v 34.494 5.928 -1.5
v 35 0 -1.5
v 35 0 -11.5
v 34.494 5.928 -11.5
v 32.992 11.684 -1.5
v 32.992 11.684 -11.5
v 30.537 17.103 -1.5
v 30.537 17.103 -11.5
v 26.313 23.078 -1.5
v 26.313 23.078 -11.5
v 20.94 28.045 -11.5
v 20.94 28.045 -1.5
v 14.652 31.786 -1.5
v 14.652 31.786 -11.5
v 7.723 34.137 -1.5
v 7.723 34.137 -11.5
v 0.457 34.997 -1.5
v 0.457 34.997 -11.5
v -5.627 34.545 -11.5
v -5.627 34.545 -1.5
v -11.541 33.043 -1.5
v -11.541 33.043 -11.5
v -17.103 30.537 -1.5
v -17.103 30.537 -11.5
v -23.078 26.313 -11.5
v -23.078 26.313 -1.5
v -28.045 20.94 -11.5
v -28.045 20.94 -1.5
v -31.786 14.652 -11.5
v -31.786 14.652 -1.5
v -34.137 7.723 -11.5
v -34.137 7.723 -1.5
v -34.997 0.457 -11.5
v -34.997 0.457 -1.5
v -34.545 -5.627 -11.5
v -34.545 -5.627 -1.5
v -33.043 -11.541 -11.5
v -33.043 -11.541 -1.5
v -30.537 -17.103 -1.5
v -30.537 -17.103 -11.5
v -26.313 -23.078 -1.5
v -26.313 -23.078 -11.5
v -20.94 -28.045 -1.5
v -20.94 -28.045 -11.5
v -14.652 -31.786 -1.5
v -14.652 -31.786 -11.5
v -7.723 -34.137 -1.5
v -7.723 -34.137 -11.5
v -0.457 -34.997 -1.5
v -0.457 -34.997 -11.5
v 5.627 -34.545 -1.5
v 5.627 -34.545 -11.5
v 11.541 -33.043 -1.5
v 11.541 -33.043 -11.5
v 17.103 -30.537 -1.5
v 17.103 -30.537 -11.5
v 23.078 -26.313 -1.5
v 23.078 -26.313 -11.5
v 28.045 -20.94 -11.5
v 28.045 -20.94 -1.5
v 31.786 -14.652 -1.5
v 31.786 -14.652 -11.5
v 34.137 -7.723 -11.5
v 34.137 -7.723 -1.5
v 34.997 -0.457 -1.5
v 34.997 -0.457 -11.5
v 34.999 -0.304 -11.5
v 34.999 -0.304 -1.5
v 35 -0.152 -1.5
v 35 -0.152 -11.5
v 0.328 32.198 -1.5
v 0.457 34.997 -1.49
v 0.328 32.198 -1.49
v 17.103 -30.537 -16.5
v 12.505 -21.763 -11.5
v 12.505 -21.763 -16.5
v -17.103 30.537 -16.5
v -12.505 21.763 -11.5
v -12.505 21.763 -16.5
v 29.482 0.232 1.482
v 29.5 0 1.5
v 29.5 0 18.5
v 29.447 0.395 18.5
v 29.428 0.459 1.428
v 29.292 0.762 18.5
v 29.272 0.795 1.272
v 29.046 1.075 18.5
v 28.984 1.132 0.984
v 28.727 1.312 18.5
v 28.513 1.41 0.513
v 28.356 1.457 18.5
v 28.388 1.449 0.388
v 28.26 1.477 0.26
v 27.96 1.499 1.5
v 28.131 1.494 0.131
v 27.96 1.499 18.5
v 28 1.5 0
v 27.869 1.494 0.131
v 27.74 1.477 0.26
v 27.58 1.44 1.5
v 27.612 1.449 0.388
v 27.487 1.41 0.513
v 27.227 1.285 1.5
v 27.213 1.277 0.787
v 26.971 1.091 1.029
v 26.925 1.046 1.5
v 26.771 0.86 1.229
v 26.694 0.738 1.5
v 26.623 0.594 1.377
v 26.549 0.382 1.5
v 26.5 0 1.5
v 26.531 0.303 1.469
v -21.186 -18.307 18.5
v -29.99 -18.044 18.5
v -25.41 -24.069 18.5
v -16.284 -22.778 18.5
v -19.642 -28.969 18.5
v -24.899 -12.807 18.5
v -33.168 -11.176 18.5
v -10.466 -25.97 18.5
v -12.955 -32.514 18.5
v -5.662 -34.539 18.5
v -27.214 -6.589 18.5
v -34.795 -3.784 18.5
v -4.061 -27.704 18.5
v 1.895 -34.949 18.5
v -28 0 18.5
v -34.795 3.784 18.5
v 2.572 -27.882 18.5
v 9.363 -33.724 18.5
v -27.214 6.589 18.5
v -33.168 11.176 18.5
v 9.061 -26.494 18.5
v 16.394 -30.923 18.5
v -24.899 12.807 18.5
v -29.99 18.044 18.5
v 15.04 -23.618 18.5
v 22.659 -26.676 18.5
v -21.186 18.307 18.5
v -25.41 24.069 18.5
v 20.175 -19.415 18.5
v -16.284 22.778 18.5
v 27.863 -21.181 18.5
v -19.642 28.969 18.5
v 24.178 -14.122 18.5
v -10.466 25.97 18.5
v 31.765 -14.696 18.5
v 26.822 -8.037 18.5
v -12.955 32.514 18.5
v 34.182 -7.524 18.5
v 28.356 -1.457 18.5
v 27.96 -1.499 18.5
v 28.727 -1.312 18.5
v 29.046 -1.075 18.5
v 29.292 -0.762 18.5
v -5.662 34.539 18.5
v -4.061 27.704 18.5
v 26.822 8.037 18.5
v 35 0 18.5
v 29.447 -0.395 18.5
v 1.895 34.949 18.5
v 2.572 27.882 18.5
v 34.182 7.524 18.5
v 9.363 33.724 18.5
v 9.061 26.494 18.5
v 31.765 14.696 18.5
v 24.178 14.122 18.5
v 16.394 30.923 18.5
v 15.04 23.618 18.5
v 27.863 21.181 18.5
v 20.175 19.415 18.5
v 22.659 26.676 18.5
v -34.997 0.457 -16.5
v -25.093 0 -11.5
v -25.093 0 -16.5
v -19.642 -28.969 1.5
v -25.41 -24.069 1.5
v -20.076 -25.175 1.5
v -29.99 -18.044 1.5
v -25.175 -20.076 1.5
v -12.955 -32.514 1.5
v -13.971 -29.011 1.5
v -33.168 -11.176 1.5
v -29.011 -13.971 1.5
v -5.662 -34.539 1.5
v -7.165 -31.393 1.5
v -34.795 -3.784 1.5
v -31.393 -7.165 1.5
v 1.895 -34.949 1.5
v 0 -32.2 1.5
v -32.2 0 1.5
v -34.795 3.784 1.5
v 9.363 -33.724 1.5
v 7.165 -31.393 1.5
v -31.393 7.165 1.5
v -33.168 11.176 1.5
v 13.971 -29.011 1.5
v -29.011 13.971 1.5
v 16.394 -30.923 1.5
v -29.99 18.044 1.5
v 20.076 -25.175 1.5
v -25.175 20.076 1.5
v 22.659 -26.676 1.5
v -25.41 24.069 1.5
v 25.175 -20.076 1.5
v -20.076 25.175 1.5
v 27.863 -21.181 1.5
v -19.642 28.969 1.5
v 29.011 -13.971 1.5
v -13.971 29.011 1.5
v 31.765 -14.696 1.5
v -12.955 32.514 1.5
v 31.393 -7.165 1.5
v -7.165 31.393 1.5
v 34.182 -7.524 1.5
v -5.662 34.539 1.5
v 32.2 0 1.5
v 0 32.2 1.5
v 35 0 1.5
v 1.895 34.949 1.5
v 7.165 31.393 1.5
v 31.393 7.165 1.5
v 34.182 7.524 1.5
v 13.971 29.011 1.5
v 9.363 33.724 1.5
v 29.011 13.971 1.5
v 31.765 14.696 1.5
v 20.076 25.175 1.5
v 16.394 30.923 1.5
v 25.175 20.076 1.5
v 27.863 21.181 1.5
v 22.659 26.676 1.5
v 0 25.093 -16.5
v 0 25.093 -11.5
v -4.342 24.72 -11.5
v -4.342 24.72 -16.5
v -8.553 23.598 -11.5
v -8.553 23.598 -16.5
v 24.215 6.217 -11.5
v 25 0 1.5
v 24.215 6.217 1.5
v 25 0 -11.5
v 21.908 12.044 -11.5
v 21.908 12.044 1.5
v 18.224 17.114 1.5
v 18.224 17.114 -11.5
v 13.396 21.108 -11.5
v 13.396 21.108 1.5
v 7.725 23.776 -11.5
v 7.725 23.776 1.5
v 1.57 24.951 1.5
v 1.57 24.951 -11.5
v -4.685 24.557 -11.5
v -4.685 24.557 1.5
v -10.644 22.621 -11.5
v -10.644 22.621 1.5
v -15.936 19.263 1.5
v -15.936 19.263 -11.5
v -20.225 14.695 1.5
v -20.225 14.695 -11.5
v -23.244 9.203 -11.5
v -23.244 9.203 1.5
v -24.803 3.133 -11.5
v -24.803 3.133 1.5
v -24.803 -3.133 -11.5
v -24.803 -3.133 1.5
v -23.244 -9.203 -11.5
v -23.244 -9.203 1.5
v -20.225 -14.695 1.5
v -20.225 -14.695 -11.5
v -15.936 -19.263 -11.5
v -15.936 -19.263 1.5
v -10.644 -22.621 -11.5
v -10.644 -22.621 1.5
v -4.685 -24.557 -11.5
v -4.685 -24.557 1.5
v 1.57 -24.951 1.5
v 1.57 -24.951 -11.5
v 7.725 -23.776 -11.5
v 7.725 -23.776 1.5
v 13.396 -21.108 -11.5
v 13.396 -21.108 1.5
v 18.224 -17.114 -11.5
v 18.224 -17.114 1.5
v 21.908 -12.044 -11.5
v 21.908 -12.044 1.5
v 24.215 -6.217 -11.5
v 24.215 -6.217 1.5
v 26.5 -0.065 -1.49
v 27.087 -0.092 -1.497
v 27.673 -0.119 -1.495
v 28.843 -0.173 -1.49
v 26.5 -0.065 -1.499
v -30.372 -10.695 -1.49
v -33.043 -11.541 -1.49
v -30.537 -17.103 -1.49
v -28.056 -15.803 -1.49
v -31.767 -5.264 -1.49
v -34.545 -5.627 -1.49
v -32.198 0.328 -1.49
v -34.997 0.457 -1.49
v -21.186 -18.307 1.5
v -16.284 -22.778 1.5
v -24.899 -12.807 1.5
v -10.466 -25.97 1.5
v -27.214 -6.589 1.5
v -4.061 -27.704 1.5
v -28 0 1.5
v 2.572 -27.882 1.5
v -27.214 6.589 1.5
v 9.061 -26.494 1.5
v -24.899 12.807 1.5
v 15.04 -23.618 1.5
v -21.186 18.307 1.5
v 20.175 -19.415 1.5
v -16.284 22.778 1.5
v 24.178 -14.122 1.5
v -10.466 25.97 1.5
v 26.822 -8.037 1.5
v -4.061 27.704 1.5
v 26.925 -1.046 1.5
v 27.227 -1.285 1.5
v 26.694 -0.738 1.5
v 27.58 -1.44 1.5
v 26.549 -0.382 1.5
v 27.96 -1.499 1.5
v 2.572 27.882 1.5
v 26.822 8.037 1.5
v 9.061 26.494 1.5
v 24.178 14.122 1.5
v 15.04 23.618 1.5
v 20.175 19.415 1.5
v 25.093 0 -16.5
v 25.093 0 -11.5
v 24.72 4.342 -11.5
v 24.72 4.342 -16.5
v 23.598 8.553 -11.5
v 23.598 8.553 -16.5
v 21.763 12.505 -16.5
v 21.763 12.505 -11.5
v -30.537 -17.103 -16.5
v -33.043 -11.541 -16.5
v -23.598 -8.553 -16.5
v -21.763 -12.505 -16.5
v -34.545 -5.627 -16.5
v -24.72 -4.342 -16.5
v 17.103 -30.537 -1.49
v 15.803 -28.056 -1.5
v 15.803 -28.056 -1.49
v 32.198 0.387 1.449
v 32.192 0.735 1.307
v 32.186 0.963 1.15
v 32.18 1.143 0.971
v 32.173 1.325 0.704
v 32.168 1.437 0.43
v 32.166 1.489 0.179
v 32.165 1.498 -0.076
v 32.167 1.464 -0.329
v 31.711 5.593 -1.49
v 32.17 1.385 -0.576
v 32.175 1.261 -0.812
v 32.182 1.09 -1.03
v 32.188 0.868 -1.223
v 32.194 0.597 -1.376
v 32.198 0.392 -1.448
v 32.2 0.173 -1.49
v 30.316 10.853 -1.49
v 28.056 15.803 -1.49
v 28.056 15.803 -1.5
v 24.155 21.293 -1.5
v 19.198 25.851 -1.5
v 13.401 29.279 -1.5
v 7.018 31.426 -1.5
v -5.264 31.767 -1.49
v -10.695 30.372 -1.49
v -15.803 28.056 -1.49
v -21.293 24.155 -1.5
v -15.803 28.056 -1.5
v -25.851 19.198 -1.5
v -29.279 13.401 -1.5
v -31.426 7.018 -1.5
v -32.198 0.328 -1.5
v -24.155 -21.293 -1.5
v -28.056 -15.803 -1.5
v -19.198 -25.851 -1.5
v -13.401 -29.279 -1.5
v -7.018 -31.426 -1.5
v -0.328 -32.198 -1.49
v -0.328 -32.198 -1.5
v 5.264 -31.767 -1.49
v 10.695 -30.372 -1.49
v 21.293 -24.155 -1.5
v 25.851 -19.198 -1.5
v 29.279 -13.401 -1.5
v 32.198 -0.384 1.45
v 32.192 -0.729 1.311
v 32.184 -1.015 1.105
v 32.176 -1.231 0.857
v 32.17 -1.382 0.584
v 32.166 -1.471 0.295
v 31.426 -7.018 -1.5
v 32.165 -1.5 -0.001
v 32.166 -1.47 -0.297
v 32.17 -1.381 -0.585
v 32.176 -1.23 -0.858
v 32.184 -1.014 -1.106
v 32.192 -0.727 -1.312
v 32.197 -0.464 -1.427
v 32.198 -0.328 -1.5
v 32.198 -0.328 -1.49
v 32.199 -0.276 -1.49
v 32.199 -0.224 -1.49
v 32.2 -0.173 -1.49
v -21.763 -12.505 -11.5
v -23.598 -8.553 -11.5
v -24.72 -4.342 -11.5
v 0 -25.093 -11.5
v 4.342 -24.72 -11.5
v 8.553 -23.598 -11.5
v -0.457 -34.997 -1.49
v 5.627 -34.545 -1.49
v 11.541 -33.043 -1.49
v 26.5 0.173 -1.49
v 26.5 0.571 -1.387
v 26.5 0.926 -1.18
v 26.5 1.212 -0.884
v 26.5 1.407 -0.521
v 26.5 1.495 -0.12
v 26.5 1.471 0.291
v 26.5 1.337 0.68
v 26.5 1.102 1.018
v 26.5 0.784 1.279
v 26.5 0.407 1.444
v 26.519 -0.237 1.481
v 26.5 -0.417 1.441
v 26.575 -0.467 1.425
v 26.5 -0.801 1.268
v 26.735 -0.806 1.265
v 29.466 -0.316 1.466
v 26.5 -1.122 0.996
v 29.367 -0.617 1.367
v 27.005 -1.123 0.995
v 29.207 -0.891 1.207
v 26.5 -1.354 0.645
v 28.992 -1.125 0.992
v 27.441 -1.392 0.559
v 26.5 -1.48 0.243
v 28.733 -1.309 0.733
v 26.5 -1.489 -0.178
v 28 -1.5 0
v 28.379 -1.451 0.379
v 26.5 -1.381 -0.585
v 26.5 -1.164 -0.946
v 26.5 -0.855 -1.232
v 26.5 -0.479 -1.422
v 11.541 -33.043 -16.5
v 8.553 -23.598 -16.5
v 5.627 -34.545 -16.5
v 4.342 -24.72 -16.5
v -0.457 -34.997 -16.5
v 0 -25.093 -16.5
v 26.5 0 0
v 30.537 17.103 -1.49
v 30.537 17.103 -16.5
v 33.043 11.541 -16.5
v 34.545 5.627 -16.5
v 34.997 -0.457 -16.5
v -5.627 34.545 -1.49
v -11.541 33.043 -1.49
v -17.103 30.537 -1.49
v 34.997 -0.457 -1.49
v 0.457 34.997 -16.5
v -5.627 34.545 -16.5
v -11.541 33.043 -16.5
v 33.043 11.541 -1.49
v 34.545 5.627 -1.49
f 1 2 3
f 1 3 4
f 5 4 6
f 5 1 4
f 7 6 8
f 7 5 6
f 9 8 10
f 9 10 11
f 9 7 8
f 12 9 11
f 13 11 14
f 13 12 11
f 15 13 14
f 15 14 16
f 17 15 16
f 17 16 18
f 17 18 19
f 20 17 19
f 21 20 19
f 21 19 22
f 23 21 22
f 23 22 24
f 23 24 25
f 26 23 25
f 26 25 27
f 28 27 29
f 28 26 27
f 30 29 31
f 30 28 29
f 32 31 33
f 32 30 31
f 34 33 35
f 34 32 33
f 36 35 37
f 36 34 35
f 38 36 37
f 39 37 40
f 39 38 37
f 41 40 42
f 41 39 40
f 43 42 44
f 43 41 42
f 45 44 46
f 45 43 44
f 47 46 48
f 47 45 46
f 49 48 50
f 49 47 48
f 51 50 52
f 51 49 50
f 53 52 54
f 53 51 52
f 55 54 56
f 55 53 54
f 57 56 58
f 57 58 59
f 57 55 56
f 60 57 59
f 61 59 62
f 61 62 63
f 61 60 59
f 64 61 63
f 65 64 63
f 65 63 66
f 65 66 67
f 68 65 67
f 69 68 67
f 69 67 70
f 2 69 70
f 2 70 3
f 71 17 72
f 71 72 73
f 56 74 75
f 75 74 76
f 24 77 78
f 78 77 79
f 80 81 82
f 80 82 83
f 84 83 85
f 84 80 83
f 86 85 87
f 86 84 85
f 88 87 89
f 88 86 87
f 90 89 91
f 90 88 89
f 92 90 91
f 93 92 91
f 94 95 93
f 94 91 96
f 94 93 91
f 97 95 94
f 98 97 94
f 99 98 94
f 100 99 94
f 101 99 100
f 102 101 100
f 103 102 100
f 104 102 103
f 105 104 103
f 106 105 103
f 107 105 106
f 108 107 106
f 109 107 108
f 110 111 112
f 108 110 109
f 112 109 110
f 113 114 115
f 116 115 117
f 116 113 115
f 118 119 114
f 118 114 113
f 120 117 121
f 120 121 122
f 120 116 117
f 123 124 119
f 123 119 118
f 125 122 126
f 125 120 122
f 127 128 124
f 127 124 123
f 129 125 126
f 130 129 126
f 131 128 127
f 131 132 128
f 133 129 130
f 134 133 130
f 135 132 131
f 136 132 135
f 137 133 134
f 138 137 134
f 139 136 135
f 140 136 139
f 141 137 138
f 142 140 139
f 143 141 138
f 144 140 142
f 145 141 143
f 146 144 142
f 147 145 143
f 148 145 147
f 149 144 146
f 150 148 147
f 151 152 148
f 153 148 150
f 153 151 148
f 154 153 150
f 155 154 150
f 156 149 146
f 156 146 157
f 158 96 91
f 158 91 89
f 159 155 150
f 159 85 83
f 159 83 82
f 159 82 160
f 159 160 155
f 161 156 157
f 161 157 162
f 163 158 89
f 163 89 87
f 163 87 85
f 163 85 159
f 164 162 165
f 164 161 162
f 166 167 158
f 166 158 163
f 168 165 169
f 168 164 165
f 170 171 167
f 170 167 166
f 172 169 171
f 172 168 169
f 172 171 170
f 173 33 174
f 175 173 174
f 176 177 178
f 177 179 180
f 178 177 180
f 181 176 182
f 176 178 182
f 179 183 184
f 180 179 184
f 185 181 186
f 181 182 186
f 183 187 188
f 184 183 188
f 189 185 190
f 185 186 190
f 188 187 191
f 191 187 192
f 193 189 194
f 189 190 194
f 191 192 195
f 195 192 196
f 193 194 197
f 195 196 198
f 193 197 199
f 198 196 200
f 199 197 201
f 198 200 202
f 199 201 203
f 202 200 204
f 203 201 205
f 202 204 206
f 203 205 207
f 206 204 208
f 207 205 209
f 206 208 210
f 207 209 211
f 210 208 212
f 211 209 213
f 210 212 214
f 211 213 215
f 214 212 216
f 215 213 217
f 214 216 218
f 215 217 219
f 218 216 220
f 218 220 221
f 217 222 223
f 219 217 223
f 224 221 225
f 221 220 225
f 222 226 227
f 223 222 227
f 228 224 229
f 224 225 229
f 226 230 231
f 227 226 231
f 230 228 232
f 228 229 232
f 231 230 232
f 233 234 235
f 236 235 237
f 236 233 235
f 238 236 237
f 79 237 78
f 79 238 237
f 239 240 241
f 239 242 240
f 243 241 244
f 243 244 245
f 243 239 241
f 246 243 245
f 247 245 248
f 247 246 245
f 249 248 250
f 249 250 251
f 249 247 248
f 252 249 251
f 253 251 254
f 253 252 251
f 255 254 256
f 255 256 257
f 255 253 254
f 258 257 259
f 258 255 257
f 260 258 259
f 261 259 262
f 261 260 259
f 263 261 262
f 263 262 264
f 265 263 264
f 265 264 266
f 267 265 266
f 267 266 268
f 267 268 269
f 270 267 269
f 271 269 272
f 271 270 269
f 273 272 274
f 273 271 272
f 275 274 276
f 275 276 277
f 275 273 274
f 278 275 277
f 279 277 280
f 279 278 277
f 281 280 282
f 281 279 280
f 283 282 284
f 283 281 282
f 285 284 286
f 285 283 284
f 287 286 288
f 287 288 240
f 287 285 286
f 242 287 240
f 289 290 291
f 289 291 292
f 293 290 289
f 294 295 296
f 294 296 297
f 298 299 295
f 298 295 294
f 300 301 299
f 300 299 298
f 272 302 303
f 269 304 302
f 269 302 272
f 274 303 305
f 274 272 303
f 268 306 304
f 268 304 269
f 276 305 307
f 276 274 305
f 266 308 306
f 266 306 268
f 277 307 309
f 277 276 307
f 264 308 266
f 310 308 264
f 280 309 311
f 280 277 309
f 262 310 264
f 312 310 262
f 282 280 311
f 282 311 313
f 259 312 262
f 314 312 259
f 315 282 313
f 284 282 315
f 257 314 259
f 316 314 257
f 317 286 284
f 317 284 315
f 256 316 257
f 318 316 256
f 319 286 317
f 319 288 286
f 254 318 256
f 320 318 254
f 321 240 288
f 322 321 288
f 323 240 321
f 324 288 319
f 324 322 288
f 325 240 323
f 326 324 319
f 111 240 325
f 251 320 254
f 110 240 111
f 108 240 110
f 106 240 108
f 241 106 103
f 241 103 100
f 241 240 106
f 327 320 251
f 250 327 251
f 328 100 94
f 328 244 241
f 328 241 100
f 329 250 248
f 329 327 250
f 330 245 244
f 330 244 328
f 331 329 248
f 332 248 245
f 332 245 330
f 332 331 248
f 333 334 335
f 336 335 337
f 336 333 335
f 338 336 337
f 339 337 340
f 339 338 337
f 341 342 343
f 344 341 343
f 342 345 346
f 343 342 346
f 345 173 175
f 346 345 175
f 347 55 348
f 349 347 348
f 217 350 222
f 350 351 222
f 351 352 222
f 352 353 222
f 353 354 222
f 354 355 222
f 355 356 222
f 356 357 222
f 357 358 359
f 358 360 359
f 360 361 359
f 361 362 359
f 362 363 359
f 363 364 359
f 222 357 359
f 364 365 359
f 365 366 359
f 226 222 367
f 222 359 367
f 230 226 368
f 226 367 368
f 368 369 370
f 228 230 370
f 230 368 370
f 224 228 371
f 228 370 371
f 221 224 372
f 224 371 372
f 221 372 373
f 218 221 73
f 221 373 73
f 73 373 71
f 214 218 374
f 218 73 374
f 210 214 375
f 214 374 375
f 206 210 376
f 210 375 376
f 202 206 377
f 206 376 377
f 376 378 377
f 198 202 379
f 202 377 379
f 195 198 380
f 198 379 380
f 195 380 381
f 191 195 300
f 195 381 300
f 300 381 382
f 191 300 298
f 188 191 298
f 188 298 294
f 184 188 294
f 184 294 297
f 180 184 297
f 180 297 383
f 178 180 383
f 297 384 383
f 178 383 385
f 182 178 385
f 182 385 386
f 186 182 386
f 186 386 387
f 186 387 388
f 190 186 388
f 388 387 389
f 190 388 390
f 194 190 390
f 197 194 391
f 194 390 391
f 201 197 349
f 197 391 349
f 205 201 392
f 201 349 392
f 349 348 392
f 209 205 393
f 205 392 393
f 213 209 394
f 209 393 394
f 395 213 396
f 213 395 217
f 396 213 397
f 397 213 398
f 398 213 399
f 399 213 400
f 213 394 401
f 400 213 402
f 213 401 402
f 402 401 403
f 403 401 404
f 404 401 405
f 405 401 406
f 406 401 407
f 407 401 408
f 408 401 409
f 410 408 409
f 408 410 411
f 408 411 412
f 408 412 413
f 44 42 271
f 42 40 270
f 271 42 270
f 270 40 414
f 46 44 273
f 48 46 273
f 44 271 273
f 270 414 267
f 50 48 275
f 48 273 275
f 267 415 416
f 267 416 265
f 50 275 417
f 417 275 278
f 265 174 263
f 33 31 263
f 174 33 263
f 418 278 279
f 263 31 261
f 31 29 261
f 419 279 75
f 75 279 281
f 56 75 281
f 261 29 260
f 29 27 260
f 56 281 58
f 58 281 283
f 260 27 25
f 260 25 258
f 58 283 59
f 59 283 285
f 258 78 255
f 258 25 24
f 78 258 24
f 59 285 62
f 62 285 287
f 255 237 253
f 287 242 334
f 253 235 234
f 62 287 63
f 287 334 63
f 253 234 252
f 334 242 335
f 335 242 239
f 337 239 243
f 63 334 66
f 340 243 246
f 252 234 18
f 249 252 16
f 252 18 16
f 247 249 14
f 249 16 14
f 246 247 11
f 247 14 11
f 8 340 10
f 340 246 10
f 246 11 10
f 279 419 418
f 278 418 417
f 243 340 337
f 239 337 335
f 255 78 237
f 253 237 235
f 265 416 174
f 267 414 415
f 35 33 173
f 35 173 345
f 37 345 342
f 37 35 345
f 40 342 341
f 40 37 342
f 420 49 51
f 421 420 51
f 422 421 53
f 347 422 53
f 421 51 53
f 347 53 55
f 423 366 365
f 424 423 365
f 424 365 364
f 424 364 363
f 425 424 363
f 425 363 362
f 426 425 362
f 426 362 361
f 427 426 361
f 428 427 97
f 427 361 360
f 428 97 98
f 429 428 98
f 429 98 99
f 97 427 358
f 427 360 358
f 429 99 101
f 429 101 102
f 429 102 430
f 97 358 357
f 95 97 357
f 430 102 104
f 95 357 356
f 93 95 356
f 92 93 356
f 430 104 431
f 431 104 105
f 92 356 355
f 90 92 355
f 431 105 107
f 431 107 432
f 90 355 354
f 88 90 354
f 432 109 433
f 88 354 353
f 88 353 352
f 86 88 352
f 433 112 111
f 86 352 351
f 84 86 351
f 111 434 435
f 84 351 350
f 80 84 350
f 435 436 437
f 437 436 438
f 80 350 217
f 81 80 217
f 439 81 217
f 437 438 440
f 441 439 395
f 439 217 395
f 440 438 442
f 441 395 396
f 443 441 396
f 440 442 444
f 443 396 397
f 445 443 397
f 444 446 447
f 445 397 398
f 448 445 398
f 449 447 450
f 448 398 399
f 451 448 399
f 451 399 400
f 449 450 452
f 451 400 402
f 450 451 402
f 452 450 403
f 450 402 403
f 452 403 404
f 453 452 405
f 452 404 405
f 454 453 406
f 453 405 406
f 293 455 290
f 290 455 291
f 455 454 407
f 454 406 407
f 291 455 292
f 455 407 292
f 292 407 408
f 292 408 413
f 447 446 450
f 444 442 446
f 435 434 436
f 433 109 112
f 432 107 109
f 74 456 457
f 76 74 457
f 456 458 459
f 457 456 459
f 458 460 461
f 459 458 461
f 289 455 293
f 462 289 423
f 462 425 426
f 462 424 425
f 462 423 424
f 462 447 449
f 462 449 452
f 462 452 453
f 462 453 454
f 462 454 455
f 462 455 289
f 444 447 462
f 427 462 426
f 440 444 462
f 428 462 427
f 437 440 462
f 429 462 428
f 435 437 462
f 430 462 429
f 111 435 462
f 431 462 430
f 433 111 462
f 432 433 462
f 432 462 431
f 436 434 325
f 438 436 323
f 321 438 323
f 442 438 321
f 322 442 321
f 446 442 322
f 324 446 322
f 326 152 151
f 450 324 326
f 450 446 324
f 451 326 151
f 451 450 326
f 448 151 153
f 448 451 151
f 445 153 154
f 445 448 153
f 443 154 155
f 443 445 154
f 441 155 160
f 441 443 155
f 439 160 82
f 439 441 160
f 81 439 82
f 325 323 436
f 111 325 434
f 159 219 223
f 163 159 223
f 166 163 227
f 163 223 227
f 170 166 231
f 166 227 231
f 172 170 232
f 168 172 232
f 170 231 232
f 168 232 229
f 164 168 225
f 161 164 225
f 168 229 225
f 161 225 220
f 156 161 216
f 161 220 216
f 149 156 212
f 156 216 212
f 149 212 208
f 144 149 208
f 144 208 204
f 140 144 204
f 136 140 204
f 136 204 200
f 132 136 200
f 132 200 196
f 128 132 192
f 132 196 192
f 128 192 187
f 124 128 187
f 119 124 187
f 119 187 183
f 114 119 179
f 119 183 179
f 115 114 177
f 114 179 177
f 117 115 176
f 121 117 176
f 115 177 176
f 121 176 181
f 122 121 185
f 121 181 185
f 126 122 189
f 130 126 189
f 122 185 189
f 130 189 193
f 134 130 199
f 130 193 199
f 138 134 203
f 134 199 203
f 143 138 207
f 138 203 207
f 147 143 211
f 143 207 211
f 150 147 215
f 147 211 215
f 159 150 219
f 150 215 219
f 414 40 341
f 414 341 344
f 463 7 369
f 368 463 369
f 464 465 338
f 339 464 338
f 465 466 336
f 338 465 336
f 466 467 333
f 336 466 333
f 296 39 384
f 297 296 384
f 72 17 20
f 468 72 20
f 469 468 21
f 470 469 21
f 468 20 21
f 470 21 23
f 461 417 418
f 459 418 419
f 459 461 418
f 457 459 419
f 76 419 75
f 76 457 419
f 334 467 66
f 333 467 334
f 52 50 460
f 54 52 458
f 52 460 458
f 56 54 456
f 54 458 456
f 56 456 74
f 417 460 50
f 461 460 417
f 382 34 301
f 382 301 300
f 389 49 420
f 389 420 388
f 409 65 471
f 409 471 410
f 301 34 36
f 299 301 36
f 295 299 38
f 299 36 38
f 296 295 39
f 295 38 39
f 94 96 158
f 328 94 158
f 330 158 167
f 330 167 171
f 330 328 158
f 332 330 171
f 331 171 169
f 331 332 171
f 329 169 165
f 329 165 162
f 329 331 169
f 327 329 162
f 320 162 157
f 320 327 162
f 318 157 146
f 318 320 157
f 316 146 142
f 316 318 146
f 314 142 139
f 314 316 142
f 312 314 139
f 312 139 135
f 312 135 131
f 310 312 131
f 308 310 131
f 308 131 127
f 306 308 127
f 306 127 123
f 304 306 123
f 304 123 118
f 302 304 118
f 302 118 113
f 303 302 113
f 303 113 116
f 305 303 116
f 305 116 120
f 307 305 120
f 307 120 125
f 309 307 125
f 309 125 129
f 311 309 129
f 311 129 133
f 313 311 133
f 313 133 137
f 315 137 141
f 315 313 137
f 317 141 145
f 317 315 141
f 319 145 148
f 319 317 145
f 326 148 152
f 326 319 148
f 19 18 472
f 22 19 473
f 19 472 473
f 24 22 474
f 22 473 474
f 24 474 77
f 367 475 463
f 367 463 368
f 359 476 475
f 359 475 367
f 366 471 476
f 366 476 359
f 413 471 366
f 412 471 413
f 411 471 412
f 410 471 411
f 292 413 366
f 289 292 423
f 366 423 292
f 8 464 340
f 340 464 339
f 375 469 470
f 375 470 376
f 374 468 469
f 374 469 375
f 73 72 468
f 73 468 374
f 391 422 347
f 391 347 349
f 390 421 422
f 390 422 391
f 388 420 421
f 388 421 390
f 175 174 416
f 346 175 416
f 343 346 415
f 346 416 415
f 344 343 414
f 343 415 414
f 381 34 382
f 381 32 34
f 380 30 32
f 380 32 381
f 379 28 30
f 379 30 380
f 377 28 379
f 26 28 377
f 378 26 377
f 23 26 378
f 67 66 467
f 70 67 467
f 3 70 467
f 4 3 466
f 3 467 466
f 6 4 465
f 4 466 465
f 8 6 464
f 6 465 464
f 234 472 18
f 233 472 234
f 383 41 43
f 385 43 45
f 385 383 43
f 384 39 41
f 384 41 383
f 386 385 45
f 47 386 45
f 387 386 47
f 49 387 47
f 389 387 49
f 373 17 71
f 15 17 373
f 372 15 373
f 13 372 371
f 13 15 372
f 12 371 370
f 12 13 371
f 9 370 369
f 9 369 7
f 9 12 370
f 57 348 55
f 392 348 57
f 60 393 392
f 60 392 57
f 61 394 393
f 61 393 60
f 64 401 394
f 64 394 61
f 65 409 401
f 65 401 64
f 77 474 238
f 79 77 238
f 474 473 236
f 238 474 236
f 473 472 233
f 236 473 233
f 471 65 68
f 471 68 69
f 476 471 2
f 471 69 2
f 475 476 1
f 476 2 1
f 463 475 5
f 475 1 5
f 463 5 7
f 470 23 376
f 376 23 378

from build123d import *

# Parameters (mm, degrees)
SKETCH005_R          = 35
SKETCH005_R_2        = 25
PAD_DEPTH            = 10
SKETCH006_R          = 32.2
SKETCH006_R_2        = 25
PAD001_DEPTH         = 3
SKETCH_R             = 35
SKETCH_R_2           = 28
PAD002_DEPTH         = 17
SKETCH004_R          = 1.5
POCKET_DEPTH         = 20
SKETCH003_R          = 1.5
POCKET001_DEPTH      = 8.5
POCKET001_DEPTH_BACK = 100
PAD003_DEPTH         = 0.01
PAD003_DEPTH_BACK    = 15
POLARPATTERN_COUNT   = 4


with BuildPart() as part:
    # Sketch005 → Pad (new body)
    with BuildSketch(Plane.XY.offset(-1.5)):
        Circle(SKETCH005_R)
        Circle(SKETCH005_R_2, mode=Mode.SUBTRACT)
    extrude(amount=-PAD_DEPTH)

    # Sketch006 → Pad001 (join)
    with BuildSketch(Plane.XY.offset(-1.5)):
        Circle(SKETCH006_R)
        Circle(SKETCH006_R_2, mode=Mode.SUBTRACT)
    extrude(amount=PAD001_DEPTH)

    # Sketch → Pad002 (join)
    with BuildSketch(Plane.XY.offset(1.5)):
        Circle(SKETCH_R)
        Circle(SKETCH_R_2, mode=Mode.SUBTRACT)
    extrude(amount=PAD002_DEPTH)

    # Sketch004 → Pocket (cut)
    with BuildSketch(Plane(origin=(28, 0, 0), x_dir=(1, 0, 0), z_dir=(0, 0, 1))):
        Circle(SKETCH004_R)
    extrude(amount=POCKET_DEPTH, mode=Mode.SUBTRACT)

    # Sketch003 → Pocket001 (cut, two sides)
    with BuildSketch(Plane(origin=(35, 0, 0), x_dir=(0, 0.939693, 0.34202), z_dir=(1, 0, 0))) as pocket001_sk:
        Circle(SKETCH003_R)
    extrude(amount=-POCKET001_DEPTH, mode=Mode.SUBTRACT)
    extrude(pocket001_sk.sketch, amount=POCKET001_DEPTH_BACK, mode=Mode.SUBTRACT)

    # Sketch002 → Pad003 (join, two sides)
    with BuildSketch(Plane.XY.offset(-1.5)) as pad003_sk:
        with BuildLine():
            ThreePointArc((-34.997021, 0.456663), (-33.922719, -8.616793), (-30.53664, -17.103029))
            Line((-30.53664, -17.103029), (-21.762611, -12.504957))
            ThreePointArc((-25.093421, 0), (-24.251171, -6.471733), (-21.762611, -12.504957))
            Line((-34.997021, 0.456663), (-25.093421, 0))
        make_face()
    pad003 = extrude(amount=PAD003_DEPTH) + extrude(pad003_sk.sketch, amount=-PAD003_DEPTH_BACK)

    # PolarPattern: Pad003 ×4 about axis
    polarpattern_axis = Axis((0, 0, -1.5), (0, 0, 1))
    for i in range(1, POLARPATTERN_COUNT):
        add(pad003.rotate(polarpattern_axis, i * 360 / POLARPATTERN_COUNT))


solid = part.part
